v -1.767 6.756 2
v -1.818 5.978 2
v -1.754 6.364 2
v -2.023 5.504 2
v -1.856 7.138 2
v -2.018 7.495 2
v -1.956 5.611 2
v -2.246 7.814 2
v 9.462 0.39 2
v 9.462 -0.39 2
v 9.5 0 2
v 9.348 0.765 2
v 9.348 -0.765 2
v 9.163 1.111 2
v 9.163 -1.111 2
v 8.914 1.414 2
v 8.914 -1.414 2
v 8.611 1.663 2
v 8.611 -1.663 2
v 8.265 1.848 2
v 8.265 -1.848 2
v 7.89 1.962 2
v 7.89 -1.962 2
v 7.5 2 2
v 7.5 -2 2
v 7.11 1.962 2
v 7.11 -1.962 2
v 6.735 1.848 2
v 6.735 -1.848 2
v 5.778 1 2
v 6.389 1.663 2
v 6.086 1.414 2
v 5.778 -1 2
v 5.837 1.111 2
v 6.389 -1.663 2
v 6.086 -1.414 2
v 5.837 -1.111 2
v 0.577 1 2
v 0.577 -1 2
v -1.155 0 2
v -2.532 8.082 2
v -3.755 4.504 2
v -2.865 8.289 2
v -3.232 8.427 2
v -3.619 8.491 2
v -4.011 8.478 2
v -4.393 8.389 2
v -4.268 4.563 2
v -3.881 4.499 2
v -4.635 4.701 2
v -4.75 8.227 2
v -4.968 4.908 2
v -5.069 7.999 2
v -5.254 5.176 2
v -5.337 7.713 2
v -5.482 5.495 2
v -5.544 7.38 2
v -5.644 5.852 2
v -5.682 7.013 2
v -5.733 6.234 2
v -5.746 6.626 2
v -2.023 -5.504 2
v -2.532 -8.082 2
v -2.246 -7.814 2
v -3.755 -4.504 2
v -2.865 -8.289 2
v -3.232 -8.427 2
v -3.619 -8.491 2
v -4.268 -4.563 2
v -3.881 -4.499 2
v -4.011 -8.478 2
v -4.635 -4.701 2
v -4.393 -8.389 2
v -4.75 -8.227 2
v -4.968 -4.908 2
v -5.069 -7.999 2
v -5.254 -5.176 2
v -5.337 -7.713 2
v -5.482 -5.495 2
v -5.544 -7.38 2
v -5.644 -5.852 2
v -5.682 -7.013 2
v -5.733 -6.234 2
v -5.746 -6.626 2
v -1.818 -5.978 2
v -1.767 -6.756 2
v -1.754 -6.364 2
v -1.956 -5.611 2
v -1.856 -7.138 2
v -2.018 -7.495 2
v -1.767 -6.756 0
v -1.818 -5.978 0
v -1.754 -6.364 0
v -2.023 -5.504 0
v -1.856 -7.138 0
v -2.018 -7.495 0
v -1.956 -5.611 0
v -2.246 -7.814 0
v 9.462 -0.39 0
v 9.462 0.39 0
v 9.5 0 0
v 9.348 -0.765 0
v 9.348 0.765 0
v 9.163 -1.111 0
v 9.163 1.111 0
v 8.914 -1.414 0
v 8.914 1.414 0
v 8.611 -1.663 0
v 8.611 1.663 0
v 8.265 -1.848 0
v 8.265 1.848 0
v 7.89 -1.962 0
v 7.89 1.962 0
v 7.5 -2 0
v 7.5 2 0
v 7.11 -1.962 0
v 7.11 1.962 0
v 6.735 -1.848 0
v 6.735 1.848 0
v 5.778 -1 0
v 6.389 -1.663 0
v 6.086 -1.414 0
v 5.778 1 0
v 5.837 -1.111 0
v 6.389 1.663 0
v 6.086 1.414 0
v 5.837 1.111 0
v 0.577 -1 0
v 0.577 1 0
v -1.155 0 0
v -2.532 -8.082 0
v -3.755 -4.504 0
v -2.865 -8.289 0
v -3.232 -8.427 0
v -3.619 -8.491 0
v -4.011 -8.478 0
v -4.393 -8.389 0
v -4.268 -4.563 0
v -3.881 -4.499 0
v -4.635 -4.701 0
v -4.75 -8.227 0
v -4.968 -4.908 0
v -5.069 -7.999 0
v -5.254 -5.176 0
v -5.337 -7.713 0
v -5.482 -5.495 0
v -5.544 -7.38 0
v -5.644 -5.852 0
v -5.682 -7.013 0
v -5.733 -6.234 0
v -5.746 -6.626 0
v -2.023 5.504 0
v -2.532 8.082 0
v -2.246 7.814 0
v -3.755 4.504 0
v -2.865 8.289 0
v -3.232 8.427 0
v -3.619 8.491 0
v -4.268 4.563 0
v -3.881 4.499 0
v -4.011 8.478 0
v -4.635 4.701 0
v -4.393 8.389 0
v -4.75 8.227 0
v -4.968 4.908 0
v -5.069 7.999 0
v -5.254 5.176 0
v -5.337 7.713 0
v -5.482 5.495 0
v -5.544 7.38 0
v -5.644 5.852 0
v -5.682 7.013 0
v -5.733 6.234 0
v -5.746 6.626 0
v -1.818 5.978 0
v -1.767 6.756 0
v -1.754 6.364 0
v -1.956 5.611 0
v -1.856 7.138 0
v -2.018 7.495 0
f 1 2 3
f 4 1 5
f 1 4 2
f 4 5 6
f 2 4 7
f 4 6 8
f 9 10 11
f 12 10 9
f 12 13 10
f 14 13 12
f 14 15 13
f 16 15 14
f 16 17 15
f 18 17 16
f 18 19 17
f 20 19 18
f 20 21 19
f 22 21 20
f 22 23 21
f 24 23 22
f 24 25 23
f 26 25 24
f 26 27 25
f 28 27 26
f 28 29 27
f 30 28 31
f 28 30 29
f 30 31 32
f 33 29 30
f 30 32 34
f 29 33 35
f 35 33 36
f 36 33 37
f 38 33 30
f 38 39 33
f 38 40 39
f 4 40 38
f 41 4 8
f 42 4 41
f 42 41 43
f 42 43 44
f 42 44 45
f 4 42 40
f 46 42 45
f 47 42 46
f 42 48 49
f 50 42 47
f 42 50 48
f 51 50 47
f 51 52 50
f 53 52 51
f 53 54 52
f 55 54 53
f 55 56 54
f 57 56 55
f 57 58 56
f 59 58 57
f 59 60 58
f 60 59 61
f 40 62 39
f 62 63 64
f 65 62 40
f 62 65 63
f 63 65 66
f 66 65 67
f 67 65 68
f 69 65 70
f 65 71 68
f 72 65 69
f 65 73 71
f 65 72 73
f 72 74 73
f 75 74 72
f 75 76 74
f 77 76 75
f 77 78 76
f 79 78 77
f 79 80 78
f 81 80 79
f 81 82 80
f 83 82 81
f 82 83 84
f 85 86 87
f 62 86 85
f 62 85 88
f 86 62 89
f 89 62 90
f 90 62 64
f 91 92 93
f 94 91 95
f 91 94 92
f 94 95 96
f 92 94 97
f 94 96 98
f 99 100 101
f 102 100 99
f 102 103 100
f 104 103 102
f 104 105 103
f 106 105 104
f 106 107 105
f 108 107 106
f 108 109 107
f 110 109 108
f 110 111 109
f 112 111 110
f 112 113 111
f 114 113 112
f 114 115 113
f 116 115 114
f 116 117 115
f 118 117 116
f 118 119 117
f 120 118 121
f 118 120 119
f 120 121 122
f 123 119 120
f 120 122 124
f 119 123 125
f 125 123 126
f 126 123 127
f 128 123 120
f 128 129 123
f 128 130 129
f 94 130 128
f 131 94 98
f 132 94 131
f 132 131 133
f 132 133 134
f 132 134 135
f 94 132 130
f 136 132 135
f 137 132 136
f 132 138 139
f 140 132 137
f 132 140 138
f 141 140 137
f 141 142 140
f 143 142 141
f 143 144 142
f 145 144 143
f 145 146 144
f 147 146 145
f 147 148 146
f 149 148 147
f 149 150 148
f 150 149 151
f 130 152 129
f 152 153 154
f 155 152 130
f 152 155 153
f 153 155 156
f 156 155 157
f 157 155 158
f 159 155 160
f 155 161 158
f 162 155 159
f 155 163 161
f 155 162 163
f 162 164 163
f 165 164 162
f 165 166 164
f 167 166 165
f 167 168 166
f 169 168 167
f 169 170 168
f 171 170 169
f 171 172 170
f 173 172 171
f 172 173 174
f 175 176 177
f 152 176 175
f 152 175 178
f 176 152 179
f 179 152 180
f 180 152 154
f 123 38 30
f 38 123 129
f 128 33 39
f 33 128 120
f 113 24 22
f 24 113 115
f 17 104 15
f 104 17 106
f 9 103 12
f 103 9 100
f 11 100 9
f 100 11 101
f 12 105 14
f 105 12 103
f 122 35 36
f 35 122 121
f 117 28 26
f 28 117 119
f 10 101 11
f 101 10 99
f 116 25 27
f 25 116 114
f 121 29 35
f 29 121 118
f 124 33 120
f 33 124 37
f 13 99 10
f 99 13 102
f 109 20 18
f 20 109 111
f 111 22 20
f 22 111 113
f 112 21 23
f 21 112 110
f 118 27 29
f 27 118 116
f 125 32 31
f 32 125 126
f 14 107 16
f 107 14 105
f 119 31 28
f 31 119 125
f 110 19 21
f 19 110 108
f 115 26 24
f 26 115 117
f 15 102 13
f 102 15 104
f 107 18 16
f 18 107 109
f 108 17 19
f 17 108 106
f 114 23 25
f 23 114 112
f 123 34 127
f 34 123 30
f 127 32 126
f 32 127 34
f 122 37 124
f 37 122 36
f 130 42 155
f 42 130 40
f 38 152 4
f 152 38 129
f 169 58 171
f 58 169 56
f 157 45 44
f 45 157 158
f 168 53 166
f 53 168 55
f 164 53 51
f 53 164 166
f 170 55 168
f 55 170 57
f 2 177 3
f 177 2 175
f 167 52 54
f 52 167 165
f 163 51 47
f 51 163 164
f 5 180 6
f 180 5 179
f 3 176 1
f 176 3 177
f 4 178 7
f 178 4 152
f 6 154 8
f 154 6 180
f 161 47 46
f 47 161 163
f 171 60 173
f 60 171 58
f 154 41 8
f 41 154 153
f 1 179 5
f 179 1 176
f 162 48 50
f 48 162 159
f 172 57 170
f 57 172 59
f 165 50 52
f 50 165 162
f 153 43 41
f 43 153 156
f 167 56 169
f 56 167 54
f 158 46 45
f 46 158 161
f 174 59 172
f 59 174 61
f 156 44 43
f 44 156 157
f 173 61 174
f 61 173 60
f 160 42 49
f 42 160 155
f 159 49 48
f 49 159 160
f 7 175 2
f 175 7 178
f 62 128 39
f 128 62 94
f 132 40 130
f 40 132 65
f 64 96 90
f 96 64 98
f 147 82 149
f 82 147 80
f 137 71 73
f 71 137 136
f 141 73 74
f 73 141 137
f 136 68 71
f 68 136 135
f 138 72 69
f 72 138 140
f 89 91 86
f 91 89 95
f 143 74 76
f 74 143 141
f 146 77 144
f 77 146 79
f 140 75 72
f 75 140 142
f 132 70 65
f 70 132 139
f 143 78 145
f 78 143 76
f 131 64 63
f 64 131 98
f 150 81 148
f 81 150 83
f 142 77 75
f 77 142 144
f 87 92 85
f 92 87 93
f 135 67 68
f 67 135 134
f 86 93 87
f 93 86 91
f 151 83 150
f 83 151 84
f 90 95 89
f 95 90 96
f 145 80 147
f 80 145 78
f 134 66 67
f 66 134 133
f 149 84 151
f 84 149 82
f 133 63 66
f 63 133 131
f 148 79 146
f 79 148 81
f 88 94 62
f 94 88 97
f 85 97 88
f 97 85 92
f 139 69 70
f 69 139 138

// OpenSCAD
// [FL_INDEX: keywords="openscad, 3d_parametric, Flexy-Frame_Construction_Kit, csg_solid" | COT="Parametric OpenSCAD design from 3DCodeverse"]
// Title: Flexy-Frame Construction Kit

// Flexy-Frame v4 by Gyrobot
// http://www.gyrobot.co.uk
//
//Standard Males were generated with the following params :
//
//    type = "male"
//    diameter_of_connection = 4
//    pitch_circle_diameter = 15
//    limb_height = 2
//    limb_thickness = 2
//
//Standard Females were generated with the following params :
//
//    type = "female"
//    diameter_of_connection = 4
//    pitch_circle_diameter = 40
//    limb_height = 2
//    limb_thickness = 3
//
// preview[view:east, tilt:top]

type = "male" ; // [male,female]
number_of_lobes = 3 ;// [2:100]
web_plate_height = 0;
diameter_of_connection = 4 ;
pitch_circle_diameter = 15 ;
male_limb_height = 2 ; // 1mm is automatically added to this for Female limb height
limb_thickness = 2 ;

// Start of Code

n=number_of_lobes ;
ph=web_plate_height ;
d=diameter_of_connection ;
pcd=pitch_circle_diameter ;
h=male_limb_height ;
t=limb_thickness ;
a=360/n ;

if (type == "male")
	male();

if (type == "female")
	female();

$fn=32*1 ;	

module male ()
{
	if (ph > 0)
		assign ($fn=n)
		cylinder (h=ph, r=pcd/2-d) ;

	for (ia = [0:a:360])
	{
		rotate (ia,[0,0,1])
		{
			translate ([0,-t/2,0])
			cube ([pcd/2,t,h]) ;
			translate ([pcd/2,0,0])
			cylinder (h=h, r=d/2) ;

		}
	}
}

module female ()
{
	difference ()
	{
		union ()
		{
			if (ph > 0)
				assign ($fn=n)
				cylinder (h=ph, r=pcd/2+d) ;

			for (ia = [0:a:360])
			{
				rotate (ia,[0,0,1])
				{
					translate ([0,-t/2,0])
						cube ([pcd/2,t,h+1]) ;
					translate ([pcd/2,0,0])
						cylinder (h=h+1, r=d) ;
					linear_extrude (height = h+1, convexity= 3)
						polygon (points=[[pcd/2-d*1.5,t/-2],[pcd/2-d*1.5,t/2],[pcd/2,d],[pcd/2,-d]]);
				}
			}
		}
		for (ia = [0:a:360])
		{
			rotate (ia,[0,0,1])
			{
				translate ([pcd/2,0,1])
					{
						cylinder (h=ph+2, r=d/2) ;
						translate ([0,-d/4,0])
						cube ([pcd/2,d/2,ph+2]) ;
					}
			}
		}
	}
}
